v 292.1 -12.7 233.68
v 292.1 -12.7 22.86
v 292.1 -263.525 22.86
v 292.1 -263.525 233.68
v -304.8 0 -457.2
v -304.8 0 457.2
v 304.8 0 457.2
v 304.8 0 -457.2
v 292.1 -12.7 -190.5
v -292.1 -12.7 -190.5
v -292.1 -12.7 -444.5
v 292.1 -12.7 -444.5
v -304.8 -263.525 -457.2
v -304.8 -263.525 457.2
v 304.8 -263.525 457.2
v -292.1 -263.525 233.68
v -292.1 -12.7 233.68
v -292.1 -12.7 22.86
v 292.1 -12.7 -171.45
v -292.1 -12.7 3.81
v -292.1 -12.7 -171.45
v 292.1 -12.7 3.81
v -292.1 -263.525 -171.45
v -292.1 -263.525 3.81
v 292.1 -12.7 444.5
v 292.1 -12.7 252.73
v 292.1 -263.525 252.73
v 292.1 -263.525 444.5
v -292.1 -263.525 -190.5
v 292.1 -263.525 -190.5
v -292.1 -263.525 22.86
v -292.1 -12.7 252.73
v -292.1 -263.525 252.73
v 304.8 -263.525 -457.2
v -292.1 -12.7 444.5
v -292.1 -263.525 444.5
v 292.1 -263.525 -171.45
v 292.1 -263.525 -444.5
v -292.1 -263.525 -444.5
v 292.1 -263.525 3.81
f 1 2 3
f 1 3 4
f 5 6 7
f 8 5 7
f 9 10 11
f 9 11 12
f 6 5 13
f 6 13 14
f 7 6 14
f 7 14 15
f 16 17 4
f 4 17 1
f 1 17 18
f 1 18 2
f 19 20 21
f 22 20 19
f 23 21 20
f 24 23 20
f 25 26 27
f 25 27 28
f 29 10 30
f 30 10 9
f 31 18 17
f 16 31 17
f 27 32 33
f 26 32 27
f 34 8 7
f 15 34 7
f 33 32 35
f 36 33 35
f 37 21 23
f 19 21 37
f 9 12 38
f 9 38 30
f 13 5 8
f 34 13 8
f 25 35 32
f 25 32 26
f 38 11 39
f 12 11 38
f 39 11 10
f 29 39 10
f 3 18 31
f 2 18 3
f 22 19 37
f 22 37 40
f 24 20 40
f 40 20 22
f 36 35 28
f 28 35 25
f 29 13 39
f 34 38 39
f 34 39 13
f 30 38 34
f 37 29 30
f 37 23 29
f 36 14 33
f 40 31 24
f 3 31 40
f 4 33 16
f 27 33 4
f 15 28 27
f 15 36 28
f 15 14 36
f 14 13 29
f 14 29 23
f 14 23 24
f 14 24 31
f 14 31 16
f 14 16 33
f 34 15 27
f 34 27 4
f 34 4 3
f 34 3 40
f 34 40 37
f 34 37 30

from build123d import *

# Parameters (mm, degrees)
F0_W     = 609.6
F0_H     = 914.4
F1_DEPTH = 263.525
F2_T     = -12.7
F3_W     = 584.2
F3_H     = 19.05
F4_DEPTH = 250.825
F5_W     = 584.2
F5_H     = 19.05
F6_DEPTH = 250.825


# Not quite as in the source:
# - the program builds the solid bodies; features that only make, move or delete a surface that nothing else refers to are left out


with BuildPart() as f1:
    # F0 (on Front) → F1 (new body)
    with BuildSketch(Plane.XZ):
        Rectangle(F0_W, F0_H)
    extrude(amount=F1_DEPTH)

    # F2
    f2_openings = [f1.faces().sort_by_distance(p)[0] for p in [
        (0, -263.525, 0),
    ]]
    offset(amount=F2_T, openings=f2_openings)

    # F3 (on face) → F4 (join)
    with BuildSketch(Plane.XZ.offset(12.7)):
        with Locations((0, -180.975)):
            Rectangle(F3_W, F3_H)
    extrude(amount=F4_DEPTH)

    # F5 (on face) → F6 (join)
    with BuildSketch(Plane.XZ.offset(12.7)):
        with Locations((0, 13.335)):
            Rectangle(F5_W, F5_H)
        with Locations((0, 243.205)):
            Rectangle(F5_W, F5_H)
    extrude(amount=F6_DEPTH)


solid = f1.part
